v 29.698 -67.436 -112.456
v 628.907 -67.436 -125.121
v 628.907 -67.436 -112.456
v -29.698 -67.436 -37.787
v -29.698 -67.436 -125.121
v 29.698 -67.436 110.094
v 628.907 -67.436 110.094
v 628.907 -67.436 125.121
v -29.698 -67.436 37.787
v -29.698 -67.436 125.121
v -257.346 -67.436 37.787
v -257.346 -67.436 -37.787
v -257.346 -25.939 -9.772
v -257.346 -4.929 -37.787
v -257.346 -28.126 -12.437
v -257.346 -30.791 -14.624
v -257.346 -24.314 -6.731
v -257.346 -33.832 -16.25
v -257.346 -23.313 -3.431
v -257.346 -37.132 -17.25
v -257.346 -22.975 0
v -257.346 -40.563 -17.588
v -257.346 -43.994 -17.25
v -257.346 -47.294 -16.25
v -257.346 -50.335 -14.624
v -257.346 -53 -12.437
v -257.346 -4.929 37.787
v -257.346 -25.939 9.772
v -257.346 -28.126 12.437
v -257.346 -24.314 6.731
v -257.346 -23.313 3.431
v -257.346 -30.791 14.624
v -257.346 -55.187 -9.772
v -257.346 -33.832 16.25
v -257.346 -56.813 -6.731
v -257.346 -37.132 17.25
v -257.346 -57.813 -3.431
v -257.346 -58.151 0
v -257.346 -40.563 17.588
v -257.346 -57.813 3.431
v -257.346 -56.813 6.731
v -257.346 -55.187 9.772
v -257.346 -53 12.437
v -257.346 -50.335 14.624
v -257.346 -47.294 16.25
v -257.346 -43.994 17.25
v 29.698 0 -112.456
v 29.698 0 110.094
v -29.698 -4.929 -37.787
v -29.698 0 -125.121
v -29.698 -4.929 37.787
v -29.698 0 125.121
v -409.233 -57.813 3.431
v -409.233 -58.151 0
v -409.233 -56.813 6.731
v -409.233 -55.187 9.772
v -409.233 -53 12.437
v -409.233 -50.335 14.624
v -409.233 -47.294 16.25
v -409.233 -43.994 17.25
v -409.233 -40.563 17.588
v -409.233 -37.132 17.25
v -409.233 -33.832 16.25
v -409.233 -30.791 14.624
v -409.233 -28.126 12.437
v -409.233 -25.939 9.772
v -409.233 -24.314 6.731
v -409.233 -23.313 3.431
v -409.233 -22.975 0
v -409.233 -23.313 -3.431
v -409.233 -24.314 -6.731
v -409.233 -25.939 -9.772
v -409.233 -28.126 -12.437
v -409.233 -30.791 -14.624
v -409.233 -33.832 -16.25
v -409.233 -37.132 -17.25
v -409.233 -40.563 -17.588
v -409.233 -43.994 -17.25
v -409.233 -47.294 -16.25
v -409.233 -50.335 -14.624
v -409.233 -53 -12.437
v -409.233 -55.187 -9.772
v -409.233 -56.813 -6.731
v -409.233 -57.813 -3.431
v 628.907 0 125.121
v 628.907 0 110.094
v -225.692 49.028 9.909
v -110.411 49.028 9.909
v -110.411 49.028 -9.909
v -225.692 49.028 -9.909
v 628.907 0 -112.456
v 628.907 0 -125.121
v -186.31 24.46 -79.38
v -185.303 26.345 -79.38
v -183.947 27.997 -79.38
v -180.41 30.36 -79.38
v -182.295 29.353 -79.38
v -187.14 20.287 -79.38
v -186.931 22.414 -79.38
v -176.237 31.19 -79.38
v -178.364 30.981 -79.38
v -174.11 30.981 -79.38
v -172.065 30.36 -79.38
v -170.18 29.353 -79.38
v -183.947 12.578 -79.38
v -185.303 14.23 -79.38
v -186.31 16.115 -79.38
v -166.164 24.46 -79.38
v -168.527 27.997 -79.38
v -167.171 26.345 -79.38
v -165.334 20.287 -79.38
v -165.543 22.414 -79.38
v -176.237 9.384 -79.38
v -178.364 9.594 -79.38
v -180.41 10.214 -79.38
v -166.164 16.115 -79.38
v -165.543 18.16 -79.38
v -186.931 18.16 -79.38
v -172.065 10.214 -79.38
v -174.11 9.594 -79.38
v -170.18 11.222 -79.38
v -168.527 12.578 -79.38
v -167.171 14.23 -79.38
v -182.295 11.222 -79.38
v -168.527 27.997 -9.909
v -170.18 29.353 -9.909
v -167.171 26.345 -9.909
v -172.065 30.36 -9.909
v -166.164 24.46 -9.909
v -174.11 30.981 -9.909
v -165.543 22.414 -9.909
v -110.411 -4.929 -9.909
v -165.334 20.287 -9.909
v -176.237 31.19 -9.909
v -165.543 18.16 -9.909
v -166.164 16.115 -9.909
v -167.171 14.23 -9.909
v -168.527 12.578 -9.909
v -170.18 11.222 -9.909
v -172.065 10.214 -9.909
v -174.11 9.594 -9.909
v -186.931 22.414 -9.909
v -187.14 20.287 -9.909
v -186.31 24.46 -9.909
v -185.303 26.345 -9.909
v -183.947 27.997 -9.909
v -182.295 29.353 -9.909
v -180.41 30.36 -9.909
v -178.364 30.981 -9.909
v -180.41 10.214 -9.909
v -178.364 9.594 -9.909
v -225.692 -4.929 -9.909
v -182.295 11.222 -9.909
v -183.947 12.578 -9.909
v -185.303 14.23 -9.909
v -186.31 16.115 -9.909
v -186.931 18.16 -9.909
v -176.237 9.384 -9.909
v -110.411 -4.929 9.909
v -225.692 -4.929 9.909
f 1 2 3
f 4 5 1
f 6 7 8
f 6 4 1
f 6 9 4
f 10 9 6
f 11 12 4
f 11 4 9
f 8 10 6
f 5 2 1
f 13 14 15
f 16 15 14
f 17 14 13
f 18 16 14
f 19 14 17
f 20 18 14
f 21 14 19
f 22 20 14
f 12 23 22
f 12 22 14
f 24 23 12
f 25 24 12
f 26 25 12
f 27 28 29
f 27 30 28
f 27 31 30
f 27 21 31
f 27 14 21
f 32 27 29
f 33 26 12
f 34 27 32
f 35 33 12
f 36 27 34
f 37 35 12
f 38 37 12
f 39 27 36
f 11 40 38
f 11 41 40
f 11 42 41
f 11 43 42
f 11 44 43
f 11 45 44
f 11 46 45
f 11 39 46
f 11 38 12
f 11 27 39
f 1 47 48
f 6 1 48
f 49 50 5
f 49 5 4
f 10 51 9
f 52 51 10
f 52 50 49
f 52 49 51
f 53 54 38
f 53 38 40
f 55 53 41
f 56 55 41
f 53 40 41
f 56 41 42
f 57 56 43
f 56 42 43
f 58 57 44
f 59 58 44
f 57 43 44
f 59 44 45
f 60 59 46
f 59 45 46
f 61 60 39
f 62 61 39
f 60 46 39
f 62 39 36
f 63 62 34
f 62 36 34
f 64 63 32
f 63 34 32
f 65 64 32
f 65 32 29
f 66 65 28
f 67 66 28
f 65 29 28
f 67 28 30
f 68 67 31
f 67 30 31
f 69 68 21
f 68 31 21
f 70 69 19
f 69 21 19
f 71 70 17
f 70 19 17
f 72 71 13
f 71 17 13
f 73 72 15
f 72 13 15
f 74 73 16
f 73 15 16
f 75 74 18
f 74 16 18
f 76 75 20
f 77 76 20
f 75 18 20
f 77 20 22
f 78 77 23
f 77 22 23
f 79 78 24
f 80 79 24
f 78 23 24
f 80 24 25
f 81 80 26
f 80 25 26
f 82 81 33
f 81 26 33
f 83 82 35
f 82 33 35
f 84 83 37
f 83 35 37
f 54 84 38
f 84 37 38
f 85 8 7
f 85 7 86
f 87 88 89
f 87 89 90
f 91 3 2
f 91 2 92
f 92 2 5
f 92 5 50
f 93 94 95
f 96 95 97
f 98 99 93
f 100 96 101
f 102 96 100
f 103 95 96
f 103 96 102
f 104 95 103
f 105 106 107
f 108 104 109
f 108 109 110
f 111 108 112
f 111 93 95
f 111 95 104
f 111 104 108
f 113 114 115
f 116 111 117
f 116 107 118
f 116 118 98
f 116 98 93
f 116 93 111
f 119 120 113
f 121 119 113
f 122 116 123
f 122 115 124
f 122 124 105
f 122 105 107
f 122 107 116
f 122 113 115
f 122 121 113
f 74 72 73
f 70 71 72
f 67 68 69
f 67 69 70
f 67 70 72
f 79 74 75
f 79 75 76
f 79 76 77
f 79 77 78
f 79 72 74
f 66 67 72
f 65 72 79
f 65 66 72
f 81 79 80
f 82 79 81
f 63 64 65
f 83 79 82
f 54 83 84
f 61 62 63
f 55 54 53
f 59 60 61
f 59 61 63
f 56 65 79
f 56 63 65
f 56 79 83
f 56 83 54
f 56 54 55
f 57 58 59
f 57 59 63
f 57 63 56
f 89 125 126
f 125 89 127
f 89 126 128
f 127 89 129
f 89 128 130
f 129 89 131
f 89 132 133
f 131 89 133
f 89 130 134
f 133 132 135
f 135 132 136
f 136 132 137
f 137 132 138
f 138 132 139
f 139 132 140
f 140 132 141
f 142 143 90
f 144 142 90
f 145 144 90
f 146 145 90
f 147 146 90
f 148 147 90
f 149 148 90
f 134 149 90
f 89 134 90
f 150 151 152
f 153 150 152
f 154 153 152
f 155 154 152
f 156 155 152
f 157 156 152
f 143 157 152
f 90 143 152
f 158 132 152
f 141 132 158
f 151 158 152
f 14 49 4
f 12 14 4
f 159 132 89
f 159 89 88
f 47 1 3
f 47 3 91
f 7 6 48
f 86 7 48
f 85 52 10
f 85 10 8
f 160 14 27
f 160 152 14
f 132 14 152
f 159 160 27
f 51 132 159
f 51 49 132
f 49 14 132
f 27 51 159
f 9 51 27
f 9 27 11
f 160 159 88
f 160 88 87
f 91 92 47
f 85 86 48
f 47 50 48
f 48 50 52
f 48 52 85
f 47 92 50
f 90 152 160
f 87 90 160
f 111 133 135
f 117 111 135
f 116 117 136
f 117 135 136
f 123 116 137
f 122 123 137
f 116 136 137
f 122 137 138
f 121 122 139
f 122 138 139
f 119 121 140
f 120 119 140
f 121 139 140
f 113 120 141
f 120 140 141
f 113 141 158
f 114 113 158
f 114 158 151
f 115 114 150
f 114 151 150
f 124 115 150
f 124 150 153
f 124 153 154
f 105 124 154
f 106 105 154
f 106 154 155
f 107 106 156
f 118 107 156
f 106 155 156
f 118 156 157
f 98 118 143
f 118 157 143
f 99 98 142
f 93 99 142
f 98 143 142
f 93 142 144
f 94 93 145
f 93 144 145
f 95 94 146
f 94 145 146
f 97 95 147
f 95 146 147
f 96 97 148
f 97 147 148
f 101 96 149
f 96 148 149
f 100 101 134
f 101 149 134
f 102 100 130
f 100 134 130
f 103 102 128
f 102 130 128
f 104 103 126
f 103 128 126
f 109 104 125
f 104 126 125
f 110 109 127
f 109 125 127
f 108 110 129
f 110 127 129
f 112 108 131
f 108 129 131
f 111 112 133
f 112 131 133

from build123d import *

# Parameters (mm, degrees)
F0_W      = 59.395711869
F0_H      = 250.2426505089
F1_DEPTH  = 67.4364492297
F2_R      = 17.4264129212
F3_DEPTH  = 222.8358983994
F4_W      = 62.507584691
F4_H      = 75.5731239915
F5_DEPTH  = 227.648139
F6_W      = 115.2810156345
F6_H      = 19.8185071349
F7_DEPTH  = 53.9569482207
F8_W      = 67.4364492297
F8_H      = 12.6657411456
F8_H_2    = 15.0272101164
F9_DEPTH  = 599.2090702057
F10_R     = 17.5883740648
F11_DEPTH = 151.8874019384
F12_R     = 10.9031193455
F13_DEPTH = 69.4709941745


# Not quite as in the source:
# - a feature names something its author has since deleted; it is built from what else it names


with BuildPart() as f1:
    # F0 (on Front) → F1 (new body)
    with BuildSketch(Plane.XZ):
        Rectangle(F0_W, F0_H)
    extrude(amount=F1_DEPTH)

    # F2 (on face) → F3 (join)
    with BuildSketch(Plane.XY.offset(125.1213252544)):
        with Locations((0, -33.2162864506)):
            Circle(F2_R)
    extrude(amount=-F3_DEPTH)

    # F4 (on face) → F5 (join)
    with BuildSketch(Plane(origin=(-29.6978559345, 0, 0), x_dir=(0, -1, 0), z_dir=(-1, 0, 0))):
        with Locations((36.1826568842, 0)):
            Rectangle(F4_W, F4_H)
    extrude(amount=F5_DEPTH)

    # F6 (on face) → F7 (join)
    with BuildSketch(Plane(origin=(0, -4.9288645387, 0), x_dir=(-1, 0, 0), z_dir=(0, 1, 0))):
        with Locations((168.05139184, 0)):
            Rectangle(F6_W, F6_H)
    extrude(amount=F7_DEPTH)

    # F8 (on face) → F9 (join)
    with BuildSketch(Plane.YZ.offset(29.6978559345)):
        with Locations((-33.7182246149, -118.7884546816)):
            Rectangle(F8_W, F8_H)
        with Locations((-33.7182246149, 117.6077201962)):
            Rectangle(F8_W, F8_H_2)
    extrude(amount=F9_DEPTH)

    # F10 (on face) → F11 (join)
    with BuildSketch(Plane(origin=(-257.3459949344, 0, 0), x_dir=(0, -1, 0), z_dir=(-1, 0, 0))):
        with Locations((40.5630767345, 0)):
            Circle(F10_R)
    extrude(amount=F11_DEPTH)

    # F12 (on face) → F13 (join)
    with BuildSketch(Plane(origin=(0, 0, -9.9092535675), x_dir=(1, 0, 0), z_dir=(0, 0, -1))):
        with Locations((-176.2370765209, -20.2873200178)):
            Circle(F12_R)
    extrude(amount=F13_DEPTH)


solid = f1.part
